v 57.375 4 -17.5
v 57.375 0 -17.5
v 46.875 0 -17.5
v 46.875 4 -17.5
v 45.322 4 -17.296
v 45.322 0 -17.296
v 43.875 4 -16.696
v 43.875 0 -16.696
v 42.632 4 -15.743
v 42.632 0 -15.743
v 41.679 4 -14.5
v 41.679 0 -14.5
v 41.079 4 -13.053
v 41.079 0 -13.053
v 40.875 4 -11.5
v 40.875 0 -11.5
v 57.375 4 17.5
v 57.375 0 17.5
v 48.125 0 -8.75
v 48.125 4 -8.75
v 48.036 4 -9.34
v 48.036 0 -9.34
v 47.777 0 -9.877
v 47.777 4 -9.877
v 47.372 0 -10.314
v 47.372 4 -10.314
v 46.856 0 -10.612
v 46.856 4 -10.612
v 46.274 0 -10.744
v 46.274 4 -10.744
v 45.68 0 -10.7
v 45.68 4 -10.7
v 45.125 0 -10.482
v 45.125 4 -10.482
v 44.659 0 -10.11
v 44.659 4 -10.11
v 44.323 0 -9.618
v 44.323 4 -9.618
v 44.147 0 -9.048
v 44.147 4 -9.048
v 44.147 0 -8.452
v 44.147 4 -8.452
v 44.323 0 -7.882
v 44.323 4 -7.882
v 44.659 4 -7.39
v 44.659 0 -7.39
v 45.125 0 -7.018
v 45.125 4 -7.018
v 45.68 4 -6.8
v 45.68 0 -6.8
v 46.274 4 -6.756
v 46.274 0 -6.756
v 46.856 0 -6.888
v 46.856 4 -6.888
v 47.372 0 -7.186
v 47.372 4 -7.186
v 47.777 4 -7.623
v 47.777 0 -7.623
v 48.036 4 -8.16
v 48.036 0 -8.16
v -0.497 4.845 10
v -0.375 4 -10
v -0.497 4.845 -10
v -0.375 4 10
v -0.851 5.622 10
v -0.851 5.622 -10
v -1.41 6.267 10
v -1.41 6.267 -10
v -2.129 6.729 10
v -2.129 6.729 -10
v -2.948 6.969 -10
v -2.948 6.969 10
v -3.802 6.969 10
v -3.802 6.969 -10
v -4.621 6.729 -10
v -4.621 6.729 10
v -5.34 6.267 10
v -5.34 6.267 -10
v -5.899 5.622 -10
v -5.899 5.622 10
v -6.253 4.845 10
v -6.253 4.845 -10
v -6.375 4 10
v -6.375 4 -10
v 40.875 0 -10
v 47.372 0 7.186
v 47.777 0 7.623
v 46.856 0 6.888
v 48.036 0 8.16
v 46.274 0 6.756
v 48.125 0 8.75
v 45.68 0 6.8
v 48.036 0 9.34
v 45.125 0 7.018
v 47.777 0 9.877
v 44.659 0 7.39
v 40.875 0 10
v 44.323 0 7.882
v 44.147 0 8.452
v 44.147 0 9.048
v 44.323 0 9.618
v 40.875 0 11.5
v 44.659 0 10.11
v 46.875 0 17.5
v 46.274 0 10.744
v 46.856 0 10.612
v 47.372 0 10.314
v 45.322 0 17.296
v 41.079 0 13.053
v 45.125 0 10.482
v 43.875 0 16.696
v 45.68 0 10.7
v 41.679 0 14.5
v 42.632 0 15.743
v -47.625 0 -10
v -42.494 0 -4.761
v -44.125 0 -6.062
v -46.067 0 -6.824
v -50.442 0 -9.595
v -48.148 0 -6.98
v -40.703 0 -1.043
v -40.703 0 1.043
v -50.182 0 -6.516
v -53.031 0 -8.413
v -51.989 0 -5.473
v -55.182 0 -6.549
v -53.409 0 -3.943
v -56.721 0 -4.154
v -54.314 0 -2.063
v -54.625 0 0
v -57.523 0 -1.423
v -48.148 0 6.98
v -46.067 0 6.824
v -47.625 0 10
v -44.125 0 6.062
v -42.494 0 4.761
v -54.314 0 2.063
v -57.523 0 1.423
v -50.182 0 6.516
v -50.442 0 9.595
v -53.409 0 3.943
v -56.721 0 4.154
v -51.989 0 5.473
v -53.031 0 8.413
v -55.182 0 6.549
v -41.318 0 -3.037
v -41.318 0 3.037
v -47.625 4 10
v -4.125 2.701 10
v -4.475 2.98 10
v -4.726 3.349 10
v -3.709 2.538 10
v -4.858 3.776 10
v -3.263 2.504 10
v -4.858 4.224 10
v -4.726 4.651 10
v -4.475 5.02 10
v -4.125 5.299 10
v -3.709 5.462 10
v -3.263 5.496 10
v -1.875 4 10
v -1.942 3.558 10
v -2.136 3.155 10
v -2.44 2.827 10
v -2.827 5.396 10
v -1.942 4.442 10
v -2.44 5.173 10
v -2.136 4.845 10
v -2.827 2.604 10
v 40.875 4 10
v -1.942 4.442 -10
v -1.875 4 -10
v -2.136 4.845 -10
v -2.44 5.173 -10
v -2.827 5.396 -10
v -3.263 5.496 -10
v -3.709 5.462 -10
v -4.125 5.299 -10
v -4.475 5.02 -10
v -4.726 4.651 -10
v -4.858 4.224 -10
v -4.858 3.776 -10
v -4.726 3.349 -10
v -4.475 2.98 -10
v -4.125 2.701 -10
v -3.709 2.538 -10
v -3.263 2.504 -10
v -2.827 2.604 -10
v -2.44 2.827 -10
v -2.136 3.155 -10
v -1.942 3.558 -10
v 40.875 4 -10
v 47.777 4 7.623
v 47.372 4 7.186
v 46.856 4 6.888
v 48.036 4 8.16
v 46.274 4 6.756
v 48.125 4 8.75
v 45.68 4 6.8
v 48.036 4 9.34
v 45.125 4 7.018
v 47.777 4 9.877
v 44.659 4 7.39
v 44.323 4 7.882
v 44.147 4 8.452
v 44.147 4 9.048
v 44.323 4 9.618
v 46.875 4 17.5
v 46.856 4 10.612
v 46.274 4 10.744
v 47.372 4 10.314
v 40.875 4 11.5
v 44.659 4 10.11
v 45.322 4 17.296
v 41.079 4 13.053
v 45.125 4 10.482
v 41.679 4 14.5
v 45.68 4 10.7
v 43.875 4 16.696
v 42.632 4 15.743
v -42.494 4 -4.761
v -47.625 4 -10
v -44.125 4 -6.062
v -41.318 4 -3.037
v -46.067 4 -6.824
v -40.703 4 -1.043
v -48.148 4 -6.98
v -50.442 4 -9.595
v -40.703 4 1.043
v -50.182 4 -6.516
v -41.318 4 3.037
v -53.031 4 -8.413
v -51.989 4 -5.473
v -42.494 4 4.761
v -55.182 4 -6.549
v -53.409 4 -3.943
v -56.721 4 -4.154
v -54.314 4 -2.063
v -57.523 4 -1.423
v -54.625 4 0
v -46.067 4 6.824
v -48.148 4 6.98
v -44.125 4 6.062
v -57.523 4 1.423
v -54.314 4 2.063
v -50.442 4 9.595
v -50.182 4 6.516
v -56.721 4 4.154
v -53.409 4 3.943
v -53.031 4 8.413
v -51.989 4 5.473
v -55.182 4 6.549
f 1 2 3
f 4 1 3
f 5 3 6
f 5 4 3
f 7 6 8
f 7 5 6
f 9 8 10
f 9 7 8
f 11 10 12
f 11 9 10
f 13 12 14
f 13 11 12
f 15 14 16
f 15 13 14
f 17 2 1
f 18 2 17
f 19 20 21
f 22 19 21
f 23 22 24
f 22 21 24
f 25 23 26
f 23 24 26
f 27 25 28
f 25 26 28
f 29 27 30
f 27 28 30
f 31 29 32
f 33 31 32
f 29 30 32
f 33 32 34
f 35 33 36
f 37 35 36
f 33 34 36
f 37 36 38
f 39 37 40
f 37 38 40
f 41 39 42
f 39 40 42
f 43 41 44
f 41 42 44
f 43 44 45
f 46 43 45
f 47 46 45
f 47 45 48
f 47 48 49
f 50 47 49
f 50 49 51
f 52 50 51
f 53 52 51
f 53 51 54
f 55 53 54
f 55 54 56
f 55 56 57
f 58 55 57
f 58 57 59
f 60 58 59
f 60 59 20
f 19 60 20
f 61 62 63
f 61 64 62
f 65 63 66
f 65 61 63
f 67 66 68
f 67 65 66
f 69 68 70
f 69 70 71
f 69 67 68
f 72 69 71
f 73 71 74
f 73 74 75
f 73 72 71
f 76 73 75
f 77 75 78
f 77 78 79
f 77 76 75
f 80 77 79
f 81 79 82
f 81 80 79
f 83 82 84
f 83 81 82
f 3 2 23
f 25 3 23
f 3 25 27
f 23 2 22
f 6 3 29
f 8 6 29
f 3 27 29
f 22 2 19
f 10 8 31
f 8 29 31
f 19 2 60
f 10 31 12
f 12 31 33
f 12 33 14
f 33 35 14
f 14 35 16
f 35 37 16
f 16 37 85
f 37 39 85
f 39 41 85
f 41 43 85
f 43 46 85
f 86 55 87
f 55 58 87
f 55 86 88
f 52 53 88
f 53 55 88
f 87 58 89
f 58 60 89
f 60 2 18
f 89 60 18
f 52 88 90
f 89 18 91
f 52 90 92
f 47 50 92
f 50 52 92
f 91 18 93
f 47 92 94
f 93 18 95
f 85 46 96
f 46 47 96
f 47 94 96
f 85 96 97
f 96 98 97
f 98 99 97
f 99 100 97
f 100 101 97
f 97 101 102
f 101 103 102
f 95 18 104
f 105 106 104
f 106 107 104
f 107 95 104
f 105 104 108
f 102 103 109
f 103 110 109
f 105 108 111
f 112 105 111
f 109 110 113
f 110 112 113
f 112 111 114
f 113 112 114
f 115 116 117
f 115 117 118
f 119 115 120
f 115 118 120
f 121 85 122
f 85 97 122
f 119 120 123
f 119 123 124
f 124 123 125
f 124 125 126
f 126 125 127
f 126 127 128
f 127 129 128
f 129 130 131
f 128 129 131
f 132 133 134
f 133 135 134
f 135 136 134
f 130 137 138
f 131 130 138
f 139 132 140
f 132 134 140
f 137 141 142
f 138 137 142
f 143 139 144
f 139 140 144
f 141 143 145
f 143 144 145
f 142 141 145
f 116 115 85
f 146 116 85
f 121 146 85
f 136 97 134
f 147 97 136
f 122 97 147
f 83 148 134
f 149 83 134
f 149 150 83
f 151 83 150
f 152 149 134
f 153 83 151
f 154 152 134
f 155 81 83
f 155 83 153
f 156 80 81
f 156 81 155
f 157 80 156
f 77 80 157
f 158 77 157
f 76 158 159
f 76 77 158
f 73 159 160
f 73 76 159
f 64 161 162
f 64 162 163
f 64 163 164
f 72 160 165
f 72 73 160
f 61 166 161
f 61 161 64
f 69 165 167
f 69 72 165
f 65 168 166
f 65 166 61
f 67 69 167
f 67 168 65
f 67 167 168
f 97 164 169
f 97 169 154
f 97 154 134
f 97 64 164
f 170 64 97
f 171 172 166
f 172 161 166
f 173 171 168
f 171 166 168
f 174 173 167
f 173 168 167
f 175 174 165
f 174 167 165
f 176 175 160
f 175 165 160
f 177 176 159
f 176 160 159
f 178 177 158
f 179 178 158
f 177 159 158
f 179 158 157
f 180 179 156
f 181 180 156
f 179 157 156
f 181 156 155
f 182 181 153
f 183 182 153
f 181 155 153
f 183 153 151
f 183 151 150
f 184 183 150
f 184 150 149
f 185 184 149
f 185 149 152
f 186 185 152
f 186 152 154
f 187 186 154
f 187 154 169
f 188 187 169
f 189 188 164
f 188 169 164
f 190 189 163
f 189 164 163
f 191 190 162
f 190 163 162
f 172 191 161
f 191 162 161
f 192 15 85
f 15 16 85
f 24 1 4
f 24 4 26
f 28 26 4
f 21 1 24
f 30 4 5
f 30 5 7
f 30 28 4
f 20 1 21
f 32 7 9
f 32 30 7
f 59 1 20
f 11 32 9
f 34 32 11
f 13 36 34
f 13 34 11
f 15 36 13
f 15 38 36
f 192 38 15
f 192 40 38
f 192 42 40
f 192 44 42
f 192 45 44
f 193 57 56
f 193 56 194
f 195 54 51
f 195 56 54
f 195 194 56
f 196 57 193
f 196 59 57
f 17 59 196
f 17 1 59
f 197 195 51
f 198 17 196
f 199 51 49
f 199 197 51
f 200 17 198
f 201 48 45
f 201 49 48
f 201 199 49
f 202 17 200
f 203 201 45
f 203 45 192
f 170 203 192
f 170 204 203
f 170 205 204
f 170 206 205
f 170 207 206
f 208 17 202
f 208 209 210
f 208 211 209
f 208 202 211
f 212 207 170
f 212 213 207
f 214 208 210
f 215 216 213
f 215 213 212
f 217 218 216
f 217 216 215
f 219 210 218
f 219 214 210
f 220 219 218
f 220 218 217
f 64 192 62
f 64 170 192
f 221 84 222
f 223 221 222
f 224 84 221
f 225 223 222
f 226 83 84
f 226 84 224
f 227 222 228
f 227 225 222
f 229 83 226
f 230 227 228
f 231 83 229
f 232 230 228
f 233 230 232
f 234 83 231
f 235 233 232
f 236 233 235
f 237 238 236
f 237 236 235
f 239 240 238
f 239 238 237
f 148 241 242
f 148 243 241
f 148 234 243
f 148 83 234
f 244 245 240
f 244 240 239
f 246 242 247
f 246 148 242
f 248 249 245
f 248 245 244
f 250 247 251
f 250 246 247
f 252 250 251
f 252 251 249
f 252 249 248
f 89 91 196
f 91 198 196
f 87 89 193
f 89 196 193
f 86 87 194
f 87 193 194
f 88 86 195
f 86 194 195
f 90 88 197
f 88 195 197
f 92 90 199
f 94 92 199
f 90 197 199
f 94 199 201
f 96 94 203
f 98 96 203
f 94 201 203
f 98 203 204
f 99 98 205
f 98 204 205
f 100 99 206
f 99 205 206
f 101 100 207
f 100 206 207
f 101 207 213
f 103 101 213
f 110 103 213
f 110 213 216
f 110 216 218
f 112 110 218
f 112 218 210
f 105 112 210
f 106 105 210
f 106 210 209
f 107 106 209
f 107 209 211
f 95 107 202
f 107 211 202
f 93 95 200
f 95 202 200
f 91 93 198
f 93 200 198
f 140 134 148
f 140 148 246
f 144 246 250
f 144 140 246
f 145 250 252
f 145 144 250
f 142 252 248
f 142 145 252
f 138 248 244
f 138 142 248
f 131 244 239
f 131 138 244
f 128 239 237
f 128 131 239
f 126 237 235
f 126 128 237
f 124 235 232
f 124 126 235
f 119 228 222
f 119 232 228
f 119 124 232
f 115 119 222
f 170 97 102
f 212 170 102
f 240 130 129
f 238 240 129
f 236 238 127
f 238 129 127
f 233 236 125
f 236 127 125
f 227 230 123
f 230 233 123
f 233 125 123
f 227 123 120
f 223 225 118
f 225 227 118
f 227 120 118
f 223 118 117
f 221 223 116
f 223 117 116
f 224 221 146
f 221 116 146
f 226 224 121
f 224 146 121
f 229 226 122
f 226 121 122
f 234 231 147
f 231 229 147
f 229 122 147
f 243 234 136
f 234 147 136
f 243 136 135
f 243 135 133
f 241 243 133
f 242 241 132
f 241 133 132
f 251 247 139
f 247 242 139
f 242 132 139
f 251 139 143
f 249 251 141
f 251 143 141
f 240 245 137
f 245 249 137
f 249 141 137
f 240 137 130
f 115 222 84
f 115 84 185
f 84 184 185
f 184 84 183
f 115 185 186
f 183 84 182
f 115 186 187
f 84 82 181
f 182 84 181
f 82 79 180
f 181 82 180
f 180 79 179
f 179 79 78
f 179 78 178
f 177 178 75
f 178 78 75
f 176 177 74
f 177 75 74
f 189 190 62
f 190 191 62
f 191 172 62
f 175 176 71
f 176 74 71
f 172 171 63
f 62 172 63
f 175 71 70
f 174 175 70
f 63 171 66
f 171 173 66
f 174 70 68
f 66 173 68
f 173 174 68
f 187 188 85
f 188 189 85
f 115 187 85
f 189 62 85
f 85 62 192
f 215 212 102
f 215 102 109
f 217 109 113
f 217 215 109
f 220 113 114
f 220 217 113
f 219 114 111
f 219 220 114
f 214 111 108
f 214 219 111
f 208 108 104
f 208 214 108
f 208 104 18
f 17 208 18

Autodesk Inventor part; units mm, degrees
ref_plane "YZ Plane" through (0, 0, 0) normal (1, 0, 0) x (0, 1, 0)
ref_plane "XZ Plane" through (0, 0, 0) normal (0, 1, 0) x (-1, 0, 0)
ref_plane "XY Plane" through (0, 0, 0) normal (0, 0, 1) x (1, 0, 0)
sketch "Main Sketch" plane through (0, 0, 0) normal (0, 1, 0) x (-1, 0, 0)
  line L0 (-57.375, -12.0472) -> (-57.375, 12.0472)
  line L1 (-57.375, 12.0472) -> (47.625, -10) construction
  line L2 (47.625, 10) -> (-57.375, -12.0472) construction
  circle A0 centre (47.625, 0) radius 7
  arc A1 (47.625, -10) -> (47.625, 10) centre (47.625, 0) ccw
  line L3 (-40.875, 17.5) -> (-57.375, 17.5)
  line L4 (-57.375, 17.5) -> (-57.375, -17.5)
  line L5 (-57.375, -17.5) -> (-40.875, -17.5)
  line L6 (-40.875, 17.5) -> (-57.375, -17.5) construction
  line L7 (-57.375, 17.5) -> (-40.875, -17.5) construction
  line L8 (47.625, -10) -> (-40.875, -10)
  line L9 (-40.875, -17.5) -> (-40.875, -10)
  line L10 (-40.875, 10) -> (-40.875, 17.5)
  line L11 (-40.875, 10) -> (47.625, 10)
  point P0 (0, 0)
  point P1 (-49.125, 0)
  dimension "d3" = 14
  dimension "d4" = 105
  dimension "d13" = 16.5
  dimension "d14" = 35
  dimension "d15" = 0
  dimension "d18" = 20
extrude "Main Extrusion" add sketch "Main Sketch" along normal blind 4
sketch "Screw Holes Sketch" plane through (0, 4, 0) normal (0, 1, 0) x (1, 0, 0)
  circle A0 centre (46.125, -8.75) radius 2
  line L0 (57.375, 17.5) -> (40.875, 17.5) projected
  line L1 (40.875, -17.5) -> (57.375, -17.5) projected
  line L2 (35.2664, 0) -> (65.7891, 0)
  line L3 (51.375, -27.0398) -> (51.375, 30.2346) construction
  line L4 (57.375, -17.5) -> (57.375, 17.5) projected
  line L5 (40.875, -10) -> (40.875, -17.5) projected
  circle A1 centre (46.125, 8.75) radius 2
  line L6 (51.375, 27.0398) -> (51.375, -30.2346) construction
  point P0 (0, 0)
  dimension "d21" = 4
  dimension "d22" = 35
  dimension "d23" = 6
  dimension "d24" = 5.25
  dimension "d25" = 5.25
  dimension "d26" = 10.5
  dimension "d27" = 8.75
  dimension "d28" = 17.5
extrude "Screw Holes Cut" cut sketch "Screw Holes Sketch" against normal through all
fillet "Smoooooooooooooooooth" radius 6 2 edges at (40.875, 2, -17.5) (40.875, 2, 17.5)
sketch "Side Axel Hole Sketch" plane through (-47.625, 0, 10) normal (0, 0, 1) x (1, 0, 0)
  line L0 (88.5, 4) -> (88.5, 0) projected
  line L1 (0, 0) -> (0, 4) projected
  line L2 (44.25, -12.0383) -> (44.25, 22.7681) construction
  line L3 (88.5, 0) -> (0, 0) projected
  line L4 (0, 4) -> (88.5, 4) projected
  circle A0 centre (44.25, 4) radius 1.5
  point P0 (47.625, 0)
  dimension "d32" = 88.5
  dimension "d33" = 44.25
  dimension "d34" = 44.25
  dimension "d35" = 4
  dimension "d41" = 3
extrude "Side Axel Hole Cut" cut sketch "Side Axel Hole Sketch" against normal blind 20 contours A0 L4 | L4 A0
sketch "Sketch6" plane through (-47.625, 0, 10) normal (0, 0, 1) x (1, 0, 0)
  arc A0 (42.75, 4) -> (45.75, 4) centre (44.25, 4) ccw projected
  circle A1 centre (44.25, 4) radius 3
  circle A2 centre (44.25, 4) radius 1.5
  point P0 (47.625, 0)
  dimension "d44" = 6
extrude "Extrusion7" add sketch "Sketch6" against normal blind 20
properties part number "TapeMeasureBracketSide"
